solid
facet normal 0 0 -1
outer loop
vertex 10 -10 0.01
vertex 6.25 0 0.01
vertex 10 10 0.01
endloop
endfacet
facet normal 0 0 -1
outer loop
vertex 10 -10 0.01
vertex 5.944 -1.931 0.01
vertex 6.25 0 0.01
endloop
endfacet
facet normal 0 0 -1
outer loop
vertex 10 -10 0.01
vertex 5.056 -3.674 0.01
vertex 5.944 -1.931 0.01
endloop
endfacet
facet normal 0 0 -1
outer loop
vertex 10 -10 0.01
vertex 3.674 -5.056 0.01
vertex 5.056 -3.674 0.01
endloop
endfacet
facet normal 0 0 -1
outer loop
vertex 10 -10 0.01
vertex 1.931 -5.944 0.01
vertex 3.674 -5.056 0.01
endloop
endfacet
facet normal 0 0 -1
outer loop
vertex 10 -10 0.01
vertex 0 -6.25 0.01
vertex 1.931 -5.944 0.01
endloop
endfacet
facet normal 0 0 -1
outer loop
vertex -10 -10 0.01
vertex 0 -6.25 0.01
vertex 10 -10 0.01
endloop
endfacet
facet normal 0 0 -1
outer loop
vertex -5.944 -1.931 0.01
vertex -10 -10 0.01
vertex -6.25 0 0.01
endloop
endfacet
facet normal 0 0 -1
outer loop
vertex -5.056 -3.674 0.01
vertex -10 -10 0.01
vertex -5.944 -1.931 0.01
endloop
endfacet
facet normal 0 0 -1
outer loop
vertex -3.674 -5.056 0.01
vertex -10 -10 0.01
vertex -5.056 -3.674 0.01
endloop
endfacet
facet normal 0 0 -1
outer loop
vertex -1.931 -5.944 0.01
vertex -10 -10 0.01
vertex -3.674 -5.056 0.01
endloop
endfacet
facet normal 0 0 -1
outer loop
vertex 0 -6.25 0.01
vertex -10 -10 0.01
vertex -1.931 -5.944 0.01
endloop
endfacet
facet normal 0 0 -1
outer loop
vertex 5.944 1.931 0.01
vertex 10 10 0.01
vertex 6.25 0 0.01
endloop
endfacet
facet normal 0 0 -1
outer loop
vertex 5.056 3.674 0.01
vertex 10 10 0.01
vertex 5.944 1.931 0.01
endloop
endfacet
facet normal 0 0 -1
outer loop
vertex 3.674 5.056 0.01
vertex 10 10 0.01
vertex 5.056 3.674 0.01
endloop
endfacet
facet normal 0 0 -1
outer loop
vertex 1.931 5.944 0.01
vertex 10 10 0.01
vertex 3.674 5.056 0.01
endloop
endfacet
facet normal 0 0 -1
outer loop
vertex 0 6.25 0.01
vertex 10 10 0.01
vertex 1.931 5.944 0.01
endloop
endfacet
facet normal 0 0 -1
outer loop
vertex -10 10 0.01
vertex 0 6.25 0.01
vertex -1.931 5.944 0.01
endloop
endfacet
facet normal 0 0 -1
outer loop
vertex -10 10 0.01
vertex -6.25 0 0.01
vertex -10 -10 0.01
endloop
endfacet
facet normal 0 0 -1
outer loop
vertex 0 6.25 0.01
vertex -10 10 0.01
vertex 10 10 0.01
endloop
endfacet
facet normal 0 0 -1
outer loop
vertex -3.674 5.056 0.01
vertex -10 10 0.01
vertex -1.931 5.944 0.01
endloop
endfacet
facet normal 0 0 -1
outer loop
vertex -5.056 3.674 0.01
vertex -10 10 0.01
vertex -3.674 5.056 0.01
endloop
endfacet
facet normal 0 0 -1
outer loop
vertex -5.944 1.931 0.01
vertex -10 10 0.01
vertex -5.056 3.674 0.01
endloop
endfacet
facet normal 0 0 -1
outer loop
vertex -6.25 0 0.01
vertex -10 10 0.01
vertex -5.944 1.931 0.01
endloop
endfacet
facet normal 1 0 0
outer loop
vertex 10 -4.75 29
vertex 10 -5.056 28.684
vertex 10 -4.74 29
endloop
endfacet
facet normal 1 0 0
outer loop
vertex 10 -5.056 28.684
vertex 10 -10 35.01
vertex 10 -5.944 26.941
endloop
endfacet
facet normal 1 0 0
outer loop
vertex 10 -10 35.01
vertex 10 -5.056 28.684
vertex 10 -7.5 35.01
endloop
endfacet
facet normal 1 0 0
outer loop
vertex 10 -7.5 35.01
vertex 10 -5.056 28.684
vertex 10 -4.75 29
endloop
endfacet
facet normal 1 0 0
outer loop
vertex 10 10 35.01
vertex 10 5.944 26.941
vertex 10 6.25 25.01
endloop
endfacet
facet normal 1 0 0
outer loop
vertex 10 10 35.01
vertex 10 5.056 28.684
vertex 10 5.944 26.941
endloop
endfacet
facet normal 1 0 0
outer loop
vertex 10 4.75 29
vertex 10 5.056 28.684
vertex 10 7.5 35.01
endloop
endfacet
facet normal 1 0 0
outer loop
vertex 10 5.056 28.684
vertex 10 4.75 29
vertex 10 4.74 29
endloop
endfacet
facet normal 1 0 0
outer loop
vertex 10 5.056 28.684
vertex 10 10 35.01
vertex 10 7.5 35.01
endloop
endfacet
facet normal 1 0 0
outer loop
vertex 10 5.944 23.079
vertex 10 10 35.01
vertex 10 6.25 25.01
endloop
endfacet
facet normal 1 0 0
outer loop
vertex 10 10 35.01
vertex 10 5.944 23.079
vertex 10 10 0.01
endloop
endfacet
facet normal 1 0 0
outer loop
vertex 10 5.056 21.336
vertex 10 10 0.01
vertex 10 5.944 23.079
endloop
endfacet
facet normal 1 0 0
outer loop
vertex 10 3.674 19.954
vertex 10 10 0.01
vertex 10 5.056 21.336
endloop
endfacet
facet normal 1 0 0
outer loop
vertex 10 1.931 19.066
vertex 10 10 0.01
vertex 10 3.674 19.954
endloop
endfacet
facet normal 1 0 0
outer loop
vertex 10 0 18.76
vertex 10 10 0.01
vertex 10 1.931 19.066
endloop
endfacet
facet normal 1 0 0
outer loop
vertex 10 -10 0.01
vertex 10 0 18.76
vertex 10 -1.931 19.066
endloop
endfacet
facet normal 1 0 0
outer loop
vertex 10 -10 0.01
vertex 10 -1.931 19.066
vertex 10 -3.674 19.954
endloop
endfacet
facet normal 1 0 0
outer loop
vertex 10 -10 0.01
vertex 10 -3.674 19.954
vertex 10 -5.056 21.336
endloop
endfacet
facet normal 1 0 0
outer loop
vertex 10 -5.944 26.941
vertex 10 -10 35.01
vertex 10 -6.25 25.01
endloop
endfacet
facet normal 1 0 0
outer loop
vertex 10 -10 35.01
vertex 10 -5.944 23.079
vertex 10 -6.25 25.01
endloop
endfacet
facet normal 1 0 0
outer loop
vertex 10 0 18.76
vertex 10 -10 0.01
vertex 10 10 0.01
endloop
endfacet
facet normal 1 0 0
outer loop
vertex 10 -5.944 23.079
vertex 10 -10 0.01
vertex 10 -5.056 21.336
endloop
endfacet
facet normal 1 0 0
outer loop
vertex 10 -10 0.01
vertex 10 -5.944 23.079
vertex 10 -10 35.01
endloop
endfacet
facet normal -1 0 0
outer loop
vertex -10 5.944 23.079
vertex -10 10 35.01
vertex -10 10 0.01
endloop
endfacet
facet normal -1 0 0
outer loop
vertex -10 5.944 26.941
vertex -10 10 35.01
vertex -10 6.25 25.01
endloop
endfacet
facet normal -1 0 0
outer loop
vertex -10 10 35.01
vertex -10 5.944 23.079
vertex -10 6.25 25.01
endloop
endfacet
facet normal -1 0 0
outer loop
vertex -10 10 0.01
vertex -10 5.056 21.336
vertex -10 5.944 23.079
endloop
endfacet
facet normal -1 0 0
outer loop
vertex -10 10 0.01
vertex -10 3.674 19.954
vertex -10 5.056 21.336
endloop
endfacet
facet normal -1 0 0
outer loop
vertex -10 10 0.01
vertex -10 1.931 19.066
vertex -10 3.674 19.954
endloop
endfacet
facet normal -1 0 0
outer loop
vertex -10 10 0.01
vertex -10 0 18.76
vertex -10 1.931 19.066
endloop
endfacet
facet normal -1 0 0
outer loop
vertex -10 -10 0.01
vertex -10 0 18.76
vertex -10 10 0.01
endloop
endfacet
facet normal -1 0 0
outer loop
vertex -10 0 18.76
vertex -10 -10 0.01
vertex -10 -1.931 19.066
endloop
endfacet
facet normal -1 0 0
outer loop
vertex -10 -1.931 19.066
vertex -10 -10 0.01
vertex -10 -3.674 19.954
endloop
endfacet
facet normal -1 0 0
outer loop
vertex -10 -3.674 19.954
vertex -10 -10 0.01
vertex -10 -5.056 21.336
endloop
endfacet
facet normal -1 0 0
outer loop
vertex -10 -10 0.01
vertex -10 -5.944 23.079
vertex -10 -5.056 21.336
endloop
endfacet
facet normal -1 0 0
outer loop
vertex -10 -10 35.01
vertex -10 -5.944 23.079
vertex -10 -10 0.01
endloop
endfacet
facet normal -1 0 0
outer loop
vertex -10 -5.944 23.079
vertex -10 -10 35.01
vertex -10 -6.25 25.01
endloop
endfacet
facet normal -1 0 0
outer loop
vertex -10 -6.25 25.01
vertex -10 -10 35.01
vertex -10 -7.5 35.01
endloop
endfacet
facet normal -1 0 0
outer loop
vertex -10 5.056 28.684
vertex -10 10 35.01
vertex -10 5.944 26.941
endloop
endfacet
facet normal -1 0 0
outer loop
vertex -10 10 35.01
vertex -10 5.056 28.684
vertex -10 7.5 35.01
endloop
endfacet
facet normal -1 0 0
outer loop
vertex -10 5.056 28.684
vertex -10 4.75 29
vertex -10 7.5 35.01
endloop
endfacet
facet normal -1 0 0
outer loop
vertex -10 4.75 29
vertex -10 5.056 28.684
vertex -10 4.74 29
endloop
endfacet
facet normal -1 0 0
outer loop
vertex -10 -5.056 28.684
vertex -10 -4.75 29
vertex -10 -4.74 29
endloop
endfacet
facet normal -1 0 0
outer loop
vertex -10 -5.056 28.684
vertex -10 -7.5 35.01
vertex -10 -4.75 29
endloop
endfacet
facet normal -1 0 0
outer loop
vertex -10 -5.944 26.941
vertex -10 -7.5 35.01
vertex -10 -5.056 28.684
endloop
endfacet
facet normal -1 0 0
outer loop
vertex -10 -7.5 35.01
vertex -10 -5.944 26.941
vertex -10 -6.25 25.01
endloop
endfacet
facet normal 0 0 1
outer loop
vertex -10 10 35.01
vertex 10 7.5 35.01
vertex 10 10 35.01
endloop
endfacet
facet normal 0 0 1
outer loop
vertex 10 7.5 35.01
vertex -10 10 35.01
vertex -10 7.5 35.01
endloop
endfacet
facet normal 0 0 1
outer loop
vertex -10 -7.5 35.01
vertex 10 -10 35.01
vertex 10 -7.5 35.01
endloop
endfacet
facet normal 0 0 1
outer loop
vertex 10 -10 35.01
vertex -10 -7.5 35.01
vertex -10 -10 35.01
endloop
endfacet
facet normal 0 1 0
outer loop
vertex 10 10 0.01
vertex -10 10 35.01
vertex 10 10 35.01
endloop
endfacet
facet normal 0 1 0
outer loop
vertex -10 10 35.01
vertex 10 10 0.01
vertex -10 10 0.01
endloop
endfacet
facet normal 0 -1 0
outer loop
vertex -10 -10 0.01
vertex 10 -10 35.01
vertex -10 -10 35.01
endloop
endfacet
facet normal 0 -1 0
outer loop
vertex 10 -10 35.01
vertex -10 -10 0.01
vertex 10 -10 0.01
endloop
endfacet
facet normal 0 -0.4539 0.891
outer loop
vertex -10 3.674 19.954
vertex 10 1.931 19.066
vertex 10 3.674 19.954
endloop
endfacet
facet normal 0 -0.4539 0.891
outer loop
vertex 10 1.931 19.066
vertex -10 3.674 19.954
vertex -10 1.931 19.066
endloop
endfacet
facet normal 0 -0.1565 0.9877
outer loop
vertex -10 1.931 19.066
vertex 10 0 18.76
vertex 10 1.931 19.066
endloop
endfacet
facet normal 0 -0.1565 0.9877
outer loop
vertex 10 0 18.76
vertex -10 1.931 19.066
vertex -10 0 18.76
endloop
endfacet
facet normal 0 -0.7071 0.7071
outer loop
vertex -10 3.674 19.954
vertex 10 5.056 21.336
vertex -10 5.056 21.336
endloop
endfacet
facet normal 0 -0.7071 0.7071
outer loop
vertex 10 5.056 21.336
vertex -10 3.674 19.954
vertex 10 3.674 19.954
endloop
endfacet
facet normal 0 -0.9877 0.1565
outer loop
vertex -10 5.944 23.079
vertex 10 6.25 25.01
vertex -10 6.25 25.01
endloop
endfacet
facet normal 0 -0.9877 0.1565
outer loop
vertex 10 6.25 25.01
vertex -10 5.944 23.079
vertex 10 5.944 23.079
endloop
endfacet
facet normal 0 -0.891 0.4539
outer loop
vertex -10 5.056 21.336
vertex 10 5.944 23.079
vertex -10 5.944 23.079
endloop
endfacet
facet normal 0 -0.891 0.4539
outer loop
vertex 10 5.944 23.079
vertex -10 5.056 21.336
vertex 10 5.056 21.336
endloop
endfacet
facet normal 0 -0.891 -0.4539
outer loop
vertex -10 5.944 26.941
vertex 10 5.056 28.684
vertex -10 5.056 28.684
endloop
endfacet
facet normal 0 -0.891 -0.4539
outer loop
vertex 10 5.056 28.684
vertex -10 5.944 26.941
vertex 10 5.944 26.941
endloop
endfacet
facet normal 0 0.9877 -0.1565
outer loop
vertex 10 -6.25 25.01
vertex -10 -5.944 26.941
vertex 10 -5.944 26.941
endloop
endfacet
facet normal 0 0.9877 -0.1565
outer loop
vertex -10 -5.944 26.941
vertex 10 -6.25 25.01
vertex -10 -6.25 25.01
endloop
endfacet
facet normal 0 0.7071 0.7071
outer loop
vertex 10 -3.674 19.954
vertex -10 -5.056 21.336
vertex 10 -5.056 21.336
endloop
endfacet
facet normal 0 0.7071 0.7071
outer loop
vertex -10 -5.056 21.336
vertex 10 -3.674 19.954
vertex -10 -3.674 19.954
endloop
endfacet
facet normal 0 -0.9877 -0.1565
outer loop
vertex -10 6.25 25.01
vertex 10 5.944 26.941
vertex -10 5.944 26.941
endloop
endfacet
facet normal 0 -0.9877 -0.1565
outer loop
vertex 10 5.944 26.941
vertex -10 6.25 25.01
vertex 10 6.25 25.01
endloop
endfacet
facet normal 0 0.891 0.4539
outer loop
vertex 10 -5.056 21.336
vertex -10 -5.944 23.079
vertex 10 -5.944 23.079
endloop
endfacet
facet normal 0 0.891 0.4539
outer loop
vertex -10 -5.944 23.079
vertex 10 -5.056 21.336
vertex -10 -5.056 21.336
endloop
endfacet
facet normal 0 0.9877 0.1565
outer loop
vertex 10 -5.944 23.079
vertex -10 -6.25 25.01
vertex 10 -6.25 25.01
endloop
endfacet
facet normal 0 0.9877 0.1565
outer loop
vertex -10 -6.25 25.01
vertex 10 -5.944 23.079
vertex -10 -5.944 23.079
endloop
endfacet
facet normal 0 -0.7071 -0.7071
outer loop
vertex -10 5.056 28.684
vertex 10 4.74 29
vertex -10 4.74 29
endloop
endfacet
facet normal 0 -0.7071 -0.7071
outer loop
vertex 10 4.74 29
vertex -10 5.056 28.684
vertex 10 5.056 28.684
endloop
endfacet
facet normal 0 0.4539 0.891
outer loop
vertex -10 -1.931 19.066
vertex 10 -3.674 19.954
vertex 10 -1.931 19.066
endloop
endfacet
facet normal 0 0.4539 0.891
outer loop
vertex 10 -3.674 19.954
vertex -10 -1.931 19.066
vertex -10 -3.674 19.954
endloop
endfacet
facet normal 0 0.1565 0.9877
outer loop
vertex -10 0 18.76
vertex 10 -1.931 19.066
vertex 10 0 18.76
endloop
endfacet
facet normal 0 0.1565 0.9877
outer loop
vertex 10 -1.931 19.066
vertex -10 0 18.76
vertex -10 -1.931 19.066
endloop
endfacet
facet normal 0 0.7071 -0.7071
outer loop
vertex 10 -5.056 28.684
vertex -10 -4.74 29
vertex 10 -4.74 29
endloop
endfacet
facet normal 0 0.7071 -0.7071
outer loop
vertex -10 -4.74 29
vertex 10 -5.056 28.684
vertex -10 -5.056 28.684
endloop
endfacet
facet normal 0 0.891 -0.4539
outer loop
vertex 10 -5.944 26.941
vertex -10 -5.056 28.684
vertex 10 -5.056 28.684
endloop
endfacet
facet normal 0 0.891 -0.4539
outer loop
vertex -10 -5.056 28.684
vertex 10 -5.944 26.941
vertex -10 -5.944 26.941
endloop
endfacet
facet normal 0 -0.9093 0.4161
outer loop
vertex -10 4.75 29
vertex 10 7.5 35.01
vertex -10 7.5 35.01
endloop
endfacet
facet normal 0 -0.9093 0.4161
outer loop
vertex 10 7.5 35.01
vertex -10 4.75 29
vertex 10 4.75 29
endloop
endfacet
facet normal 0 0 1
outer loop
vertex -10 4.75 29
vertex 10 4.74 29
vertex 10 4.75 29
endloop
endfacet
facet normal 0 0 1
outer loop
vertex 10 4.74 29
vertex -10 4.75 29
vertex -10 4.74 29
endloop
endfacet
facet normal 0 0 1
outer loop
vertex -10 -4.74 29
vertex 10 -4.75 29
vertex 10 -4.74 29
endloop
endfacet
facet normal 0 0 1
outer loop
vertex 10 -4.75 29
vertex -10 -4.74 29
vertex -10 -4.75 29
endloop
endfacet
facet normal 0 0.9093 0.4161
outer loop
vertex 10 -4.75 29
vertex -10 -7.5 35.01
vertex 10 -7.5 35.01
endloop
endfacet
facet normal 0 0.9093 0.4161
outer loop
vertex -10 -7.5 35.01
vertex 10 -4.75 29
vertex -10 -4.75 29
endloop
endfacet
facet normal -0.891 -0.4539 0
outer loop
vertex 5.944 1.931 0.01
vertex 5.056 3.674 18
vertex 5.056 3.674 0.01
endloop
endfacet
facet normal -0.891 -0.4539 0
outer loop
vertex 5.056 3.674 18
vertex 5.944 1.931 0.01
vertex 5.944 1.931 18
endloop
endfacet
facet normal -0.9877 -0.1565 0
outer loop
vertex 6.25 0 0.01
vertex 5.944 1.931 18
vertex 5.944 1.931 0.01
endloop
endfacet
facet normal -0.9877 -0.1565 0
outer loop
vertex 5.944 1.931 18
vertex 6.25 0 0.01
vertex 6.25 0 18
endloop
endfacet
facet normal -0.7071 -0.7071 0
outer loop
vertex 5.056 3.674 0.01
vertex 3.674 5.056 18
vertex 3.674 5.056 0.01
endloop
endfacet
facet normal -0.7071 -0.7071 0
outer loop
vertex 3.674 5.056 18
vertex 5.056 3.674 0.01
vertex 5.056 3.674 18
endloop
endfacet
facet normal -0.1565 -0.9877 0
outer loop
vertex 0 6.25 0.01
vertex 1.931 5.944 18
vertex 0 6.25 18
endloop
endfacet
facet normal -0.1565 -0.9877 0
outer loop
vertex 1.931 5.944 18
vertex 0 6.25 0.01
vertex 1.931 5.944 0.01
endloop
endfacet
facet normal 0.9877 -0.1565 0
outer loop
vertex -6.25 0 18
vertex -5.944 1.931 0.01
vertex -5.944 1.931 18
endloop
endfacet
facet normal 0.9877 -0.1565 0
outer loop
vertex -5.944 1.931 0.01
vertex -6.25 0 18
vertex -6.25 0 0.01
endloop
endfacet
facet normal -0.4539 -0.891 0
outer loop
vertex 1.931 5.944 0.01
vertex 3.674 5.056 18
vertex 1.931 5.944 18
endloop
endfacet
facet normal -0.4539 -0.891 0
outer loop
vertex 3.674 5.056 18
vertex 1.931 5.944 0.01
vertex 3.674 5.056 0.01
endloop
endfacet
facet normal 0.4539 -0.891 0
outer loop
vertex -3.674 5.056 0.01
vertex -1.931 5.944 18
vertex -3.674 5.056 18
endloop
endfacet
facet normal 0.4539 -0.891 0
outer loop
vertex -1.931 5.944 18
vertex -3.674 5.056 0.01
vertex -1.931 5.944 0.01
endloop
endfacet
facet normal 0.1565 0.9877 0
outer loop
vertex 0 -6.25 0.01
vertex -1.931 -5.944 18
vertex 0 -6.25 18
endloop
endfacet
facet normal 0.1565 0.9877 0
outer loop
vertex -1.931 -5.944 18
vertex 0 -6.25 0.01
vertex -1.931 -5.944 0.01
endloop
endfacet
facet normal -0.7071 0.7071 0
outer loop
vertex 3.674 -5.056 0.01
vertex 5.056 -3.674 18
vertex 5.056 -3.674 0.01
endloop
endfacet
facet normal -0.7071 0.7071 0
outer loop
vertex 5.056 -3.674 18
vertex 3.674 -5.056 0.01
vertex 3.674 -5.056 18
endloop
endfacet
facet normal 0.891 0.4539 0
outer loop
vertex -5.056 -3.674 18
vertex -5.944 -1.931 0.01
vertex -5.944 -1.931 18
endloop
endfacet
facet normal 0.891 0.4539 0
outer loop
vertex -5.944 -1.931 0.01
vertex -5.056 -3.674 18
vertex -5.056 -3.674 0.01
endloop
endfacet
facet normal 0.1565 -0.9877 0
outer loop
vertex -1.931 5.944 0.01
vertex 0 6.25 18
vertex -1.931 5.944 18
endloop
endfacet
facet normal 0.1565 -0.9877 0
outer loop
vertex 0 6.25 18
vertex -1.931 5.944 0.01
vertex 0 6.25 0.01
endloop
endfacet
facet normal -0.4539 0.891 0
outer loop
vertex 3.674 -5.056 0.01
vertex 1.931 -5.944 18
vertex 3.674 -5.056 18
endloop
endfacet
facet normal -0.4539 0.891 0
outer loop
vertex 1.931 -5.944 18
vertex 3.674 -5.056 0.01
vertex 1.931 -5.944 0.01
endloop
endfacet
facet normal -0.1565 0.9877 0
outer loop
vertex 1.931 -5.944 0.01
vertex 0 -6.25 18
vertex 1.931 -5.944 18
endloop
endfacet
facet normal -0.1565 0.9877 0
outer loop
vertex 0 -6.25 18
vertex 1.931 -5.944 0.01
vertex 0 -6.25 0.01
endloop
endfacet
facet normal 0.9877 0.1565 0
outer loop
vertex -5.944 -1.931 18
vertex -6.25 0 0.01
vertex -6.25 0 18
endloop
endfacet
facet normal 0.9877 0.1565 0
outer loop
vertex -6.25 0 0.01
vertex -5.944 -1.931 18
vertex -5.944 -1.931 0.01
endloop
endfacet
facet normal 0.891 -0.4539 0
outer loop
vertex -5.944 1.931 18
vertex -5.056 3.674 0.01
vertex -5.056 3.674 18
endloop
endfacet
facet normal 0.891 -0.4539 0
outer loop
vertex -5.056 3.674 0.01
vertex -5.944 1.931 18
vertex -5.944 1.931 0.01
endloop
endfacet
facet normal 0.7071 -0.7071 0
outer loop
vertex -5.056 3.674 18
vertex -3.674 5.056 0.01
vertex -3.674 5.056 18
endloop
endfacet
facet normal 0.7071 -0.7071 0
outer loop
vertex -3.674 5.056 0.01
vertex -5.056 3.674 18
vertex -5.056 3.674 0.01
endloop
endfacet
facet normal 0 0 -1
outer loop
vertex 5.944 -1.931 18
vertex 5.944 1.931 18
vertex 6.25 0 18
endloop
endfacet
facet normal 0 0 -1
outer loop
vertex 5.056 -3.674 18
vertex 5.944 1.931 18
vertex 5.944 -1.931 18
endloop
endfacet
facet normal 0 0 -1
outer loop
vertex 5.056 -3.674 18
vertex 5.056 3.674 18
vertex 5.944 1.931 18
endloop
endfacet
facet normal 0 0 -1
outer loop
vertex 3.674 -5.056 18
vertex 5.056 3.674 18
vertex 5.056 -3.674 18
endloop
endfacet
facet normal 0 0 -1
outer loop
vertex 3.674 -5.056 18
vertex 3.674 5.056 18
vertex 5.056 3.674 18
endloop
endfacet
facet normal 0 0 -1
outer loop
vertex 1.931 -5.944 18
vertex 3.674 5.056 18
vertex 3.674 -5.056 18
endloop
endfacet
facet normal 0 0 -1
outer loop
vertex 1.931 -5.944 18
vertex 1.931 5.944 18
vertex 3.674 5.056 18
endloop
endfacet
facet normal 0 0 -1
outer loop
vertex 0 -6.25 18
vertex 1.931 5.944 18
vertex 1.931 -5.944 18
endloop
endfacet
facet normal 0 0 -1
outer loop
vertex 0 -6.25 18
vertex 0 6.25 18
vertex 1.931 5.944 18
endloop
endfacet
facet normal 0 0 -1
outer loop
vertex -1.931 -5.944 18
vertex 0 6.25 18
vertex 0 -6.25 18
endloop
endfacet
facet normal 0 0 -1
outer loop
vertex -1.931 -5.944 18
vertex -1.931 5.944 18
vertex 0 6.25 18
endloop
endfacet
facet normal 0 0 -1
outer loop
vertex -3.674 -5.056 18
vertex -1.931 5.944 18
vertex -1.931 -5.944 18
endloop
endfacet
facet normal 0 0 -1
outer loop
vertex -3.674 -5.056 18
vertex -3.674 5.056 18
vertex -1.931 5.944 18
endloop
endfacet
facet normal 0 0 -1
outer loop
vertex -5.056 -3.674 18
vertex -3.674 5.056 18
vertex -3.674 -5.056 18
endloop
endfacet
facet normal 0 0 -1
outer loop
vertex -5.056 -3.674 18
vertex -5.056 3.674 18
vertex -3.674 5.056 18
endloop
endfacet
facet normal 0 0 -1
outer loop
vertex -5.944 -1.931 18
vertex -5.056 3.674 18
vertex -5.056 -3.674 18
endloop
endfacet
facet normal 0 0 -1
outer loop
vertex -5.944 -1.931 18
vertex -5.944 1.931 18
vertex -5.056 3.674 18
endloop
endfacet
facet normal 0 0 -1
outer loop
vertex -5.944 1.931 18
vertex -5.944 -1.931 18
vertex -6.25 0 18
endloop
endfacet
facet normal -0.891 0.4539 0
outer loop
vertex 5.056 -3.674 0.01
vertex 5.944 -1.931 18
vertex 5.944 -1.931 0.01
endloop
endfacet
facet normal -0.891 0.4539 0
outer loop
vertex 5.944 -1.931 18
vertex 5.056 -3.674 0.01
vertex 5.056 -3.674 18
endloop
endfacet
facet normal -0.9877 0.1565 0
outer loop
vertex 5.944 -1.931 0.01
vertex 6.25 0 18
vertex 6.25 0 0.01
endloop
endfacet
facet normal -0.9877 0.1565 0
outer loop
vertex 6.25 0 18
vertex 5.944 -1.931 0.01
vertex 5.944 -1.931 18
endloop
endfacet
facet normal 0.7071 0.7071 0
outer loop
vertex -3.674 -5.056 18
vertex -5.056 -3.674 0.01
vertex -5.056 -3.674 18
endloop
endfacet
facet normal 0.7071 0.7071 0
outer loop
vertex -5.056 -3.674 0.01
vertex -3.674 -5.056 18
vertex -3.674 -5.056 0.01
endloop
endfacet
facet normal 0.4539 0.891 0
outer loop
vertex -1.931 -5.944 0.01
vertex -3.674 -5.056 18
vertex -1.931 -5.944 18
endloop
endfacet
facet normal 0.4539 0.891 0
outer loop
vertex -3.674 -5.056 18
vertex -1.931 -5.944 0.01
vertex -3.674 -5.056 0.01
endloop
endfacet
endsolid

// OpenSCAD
l = 35;
l_in = 18;
a = 20;
d_in = 14.2;
d_out = 12.5;
hole_offset = 10;
arrow_wide = 15;
arrow_thin = 9.5;
arrow_length = 6;
zero = 0.01;

module Arrow(){
    hull(){
        translate([-zero,-arrow_wide/2,-zero])cube([zero, arrow_wide, a+2*zero]);
        translate([arrow_length,-arrow_thin/2,-zero])cube([zero, arrow_thin, a+2*zero]);
    }
}

module Basic_shape(){
    difference() {
        translate([-hole_offset, -a/2, 0])cube([l, a, a]);
        translate([0,0,-1])cylinder(d=d_out, h=1000);
    }
}


module Basic_shape_moved(){
    translate([10,0,0])Basic_shape();
}

module Clips(){
    difference(){
        Basic_shape_moved();
        Arrow();
    }
}

module Standing_clips(){
    translate([-a/2,0,l+zero])rotate([0,90,0])Clips();
}

module Holed_clips(){
    difference() {
        Standing_clips();
        cylinder(d = d_out, h = l_in);
    }
}

Holed_clips();
